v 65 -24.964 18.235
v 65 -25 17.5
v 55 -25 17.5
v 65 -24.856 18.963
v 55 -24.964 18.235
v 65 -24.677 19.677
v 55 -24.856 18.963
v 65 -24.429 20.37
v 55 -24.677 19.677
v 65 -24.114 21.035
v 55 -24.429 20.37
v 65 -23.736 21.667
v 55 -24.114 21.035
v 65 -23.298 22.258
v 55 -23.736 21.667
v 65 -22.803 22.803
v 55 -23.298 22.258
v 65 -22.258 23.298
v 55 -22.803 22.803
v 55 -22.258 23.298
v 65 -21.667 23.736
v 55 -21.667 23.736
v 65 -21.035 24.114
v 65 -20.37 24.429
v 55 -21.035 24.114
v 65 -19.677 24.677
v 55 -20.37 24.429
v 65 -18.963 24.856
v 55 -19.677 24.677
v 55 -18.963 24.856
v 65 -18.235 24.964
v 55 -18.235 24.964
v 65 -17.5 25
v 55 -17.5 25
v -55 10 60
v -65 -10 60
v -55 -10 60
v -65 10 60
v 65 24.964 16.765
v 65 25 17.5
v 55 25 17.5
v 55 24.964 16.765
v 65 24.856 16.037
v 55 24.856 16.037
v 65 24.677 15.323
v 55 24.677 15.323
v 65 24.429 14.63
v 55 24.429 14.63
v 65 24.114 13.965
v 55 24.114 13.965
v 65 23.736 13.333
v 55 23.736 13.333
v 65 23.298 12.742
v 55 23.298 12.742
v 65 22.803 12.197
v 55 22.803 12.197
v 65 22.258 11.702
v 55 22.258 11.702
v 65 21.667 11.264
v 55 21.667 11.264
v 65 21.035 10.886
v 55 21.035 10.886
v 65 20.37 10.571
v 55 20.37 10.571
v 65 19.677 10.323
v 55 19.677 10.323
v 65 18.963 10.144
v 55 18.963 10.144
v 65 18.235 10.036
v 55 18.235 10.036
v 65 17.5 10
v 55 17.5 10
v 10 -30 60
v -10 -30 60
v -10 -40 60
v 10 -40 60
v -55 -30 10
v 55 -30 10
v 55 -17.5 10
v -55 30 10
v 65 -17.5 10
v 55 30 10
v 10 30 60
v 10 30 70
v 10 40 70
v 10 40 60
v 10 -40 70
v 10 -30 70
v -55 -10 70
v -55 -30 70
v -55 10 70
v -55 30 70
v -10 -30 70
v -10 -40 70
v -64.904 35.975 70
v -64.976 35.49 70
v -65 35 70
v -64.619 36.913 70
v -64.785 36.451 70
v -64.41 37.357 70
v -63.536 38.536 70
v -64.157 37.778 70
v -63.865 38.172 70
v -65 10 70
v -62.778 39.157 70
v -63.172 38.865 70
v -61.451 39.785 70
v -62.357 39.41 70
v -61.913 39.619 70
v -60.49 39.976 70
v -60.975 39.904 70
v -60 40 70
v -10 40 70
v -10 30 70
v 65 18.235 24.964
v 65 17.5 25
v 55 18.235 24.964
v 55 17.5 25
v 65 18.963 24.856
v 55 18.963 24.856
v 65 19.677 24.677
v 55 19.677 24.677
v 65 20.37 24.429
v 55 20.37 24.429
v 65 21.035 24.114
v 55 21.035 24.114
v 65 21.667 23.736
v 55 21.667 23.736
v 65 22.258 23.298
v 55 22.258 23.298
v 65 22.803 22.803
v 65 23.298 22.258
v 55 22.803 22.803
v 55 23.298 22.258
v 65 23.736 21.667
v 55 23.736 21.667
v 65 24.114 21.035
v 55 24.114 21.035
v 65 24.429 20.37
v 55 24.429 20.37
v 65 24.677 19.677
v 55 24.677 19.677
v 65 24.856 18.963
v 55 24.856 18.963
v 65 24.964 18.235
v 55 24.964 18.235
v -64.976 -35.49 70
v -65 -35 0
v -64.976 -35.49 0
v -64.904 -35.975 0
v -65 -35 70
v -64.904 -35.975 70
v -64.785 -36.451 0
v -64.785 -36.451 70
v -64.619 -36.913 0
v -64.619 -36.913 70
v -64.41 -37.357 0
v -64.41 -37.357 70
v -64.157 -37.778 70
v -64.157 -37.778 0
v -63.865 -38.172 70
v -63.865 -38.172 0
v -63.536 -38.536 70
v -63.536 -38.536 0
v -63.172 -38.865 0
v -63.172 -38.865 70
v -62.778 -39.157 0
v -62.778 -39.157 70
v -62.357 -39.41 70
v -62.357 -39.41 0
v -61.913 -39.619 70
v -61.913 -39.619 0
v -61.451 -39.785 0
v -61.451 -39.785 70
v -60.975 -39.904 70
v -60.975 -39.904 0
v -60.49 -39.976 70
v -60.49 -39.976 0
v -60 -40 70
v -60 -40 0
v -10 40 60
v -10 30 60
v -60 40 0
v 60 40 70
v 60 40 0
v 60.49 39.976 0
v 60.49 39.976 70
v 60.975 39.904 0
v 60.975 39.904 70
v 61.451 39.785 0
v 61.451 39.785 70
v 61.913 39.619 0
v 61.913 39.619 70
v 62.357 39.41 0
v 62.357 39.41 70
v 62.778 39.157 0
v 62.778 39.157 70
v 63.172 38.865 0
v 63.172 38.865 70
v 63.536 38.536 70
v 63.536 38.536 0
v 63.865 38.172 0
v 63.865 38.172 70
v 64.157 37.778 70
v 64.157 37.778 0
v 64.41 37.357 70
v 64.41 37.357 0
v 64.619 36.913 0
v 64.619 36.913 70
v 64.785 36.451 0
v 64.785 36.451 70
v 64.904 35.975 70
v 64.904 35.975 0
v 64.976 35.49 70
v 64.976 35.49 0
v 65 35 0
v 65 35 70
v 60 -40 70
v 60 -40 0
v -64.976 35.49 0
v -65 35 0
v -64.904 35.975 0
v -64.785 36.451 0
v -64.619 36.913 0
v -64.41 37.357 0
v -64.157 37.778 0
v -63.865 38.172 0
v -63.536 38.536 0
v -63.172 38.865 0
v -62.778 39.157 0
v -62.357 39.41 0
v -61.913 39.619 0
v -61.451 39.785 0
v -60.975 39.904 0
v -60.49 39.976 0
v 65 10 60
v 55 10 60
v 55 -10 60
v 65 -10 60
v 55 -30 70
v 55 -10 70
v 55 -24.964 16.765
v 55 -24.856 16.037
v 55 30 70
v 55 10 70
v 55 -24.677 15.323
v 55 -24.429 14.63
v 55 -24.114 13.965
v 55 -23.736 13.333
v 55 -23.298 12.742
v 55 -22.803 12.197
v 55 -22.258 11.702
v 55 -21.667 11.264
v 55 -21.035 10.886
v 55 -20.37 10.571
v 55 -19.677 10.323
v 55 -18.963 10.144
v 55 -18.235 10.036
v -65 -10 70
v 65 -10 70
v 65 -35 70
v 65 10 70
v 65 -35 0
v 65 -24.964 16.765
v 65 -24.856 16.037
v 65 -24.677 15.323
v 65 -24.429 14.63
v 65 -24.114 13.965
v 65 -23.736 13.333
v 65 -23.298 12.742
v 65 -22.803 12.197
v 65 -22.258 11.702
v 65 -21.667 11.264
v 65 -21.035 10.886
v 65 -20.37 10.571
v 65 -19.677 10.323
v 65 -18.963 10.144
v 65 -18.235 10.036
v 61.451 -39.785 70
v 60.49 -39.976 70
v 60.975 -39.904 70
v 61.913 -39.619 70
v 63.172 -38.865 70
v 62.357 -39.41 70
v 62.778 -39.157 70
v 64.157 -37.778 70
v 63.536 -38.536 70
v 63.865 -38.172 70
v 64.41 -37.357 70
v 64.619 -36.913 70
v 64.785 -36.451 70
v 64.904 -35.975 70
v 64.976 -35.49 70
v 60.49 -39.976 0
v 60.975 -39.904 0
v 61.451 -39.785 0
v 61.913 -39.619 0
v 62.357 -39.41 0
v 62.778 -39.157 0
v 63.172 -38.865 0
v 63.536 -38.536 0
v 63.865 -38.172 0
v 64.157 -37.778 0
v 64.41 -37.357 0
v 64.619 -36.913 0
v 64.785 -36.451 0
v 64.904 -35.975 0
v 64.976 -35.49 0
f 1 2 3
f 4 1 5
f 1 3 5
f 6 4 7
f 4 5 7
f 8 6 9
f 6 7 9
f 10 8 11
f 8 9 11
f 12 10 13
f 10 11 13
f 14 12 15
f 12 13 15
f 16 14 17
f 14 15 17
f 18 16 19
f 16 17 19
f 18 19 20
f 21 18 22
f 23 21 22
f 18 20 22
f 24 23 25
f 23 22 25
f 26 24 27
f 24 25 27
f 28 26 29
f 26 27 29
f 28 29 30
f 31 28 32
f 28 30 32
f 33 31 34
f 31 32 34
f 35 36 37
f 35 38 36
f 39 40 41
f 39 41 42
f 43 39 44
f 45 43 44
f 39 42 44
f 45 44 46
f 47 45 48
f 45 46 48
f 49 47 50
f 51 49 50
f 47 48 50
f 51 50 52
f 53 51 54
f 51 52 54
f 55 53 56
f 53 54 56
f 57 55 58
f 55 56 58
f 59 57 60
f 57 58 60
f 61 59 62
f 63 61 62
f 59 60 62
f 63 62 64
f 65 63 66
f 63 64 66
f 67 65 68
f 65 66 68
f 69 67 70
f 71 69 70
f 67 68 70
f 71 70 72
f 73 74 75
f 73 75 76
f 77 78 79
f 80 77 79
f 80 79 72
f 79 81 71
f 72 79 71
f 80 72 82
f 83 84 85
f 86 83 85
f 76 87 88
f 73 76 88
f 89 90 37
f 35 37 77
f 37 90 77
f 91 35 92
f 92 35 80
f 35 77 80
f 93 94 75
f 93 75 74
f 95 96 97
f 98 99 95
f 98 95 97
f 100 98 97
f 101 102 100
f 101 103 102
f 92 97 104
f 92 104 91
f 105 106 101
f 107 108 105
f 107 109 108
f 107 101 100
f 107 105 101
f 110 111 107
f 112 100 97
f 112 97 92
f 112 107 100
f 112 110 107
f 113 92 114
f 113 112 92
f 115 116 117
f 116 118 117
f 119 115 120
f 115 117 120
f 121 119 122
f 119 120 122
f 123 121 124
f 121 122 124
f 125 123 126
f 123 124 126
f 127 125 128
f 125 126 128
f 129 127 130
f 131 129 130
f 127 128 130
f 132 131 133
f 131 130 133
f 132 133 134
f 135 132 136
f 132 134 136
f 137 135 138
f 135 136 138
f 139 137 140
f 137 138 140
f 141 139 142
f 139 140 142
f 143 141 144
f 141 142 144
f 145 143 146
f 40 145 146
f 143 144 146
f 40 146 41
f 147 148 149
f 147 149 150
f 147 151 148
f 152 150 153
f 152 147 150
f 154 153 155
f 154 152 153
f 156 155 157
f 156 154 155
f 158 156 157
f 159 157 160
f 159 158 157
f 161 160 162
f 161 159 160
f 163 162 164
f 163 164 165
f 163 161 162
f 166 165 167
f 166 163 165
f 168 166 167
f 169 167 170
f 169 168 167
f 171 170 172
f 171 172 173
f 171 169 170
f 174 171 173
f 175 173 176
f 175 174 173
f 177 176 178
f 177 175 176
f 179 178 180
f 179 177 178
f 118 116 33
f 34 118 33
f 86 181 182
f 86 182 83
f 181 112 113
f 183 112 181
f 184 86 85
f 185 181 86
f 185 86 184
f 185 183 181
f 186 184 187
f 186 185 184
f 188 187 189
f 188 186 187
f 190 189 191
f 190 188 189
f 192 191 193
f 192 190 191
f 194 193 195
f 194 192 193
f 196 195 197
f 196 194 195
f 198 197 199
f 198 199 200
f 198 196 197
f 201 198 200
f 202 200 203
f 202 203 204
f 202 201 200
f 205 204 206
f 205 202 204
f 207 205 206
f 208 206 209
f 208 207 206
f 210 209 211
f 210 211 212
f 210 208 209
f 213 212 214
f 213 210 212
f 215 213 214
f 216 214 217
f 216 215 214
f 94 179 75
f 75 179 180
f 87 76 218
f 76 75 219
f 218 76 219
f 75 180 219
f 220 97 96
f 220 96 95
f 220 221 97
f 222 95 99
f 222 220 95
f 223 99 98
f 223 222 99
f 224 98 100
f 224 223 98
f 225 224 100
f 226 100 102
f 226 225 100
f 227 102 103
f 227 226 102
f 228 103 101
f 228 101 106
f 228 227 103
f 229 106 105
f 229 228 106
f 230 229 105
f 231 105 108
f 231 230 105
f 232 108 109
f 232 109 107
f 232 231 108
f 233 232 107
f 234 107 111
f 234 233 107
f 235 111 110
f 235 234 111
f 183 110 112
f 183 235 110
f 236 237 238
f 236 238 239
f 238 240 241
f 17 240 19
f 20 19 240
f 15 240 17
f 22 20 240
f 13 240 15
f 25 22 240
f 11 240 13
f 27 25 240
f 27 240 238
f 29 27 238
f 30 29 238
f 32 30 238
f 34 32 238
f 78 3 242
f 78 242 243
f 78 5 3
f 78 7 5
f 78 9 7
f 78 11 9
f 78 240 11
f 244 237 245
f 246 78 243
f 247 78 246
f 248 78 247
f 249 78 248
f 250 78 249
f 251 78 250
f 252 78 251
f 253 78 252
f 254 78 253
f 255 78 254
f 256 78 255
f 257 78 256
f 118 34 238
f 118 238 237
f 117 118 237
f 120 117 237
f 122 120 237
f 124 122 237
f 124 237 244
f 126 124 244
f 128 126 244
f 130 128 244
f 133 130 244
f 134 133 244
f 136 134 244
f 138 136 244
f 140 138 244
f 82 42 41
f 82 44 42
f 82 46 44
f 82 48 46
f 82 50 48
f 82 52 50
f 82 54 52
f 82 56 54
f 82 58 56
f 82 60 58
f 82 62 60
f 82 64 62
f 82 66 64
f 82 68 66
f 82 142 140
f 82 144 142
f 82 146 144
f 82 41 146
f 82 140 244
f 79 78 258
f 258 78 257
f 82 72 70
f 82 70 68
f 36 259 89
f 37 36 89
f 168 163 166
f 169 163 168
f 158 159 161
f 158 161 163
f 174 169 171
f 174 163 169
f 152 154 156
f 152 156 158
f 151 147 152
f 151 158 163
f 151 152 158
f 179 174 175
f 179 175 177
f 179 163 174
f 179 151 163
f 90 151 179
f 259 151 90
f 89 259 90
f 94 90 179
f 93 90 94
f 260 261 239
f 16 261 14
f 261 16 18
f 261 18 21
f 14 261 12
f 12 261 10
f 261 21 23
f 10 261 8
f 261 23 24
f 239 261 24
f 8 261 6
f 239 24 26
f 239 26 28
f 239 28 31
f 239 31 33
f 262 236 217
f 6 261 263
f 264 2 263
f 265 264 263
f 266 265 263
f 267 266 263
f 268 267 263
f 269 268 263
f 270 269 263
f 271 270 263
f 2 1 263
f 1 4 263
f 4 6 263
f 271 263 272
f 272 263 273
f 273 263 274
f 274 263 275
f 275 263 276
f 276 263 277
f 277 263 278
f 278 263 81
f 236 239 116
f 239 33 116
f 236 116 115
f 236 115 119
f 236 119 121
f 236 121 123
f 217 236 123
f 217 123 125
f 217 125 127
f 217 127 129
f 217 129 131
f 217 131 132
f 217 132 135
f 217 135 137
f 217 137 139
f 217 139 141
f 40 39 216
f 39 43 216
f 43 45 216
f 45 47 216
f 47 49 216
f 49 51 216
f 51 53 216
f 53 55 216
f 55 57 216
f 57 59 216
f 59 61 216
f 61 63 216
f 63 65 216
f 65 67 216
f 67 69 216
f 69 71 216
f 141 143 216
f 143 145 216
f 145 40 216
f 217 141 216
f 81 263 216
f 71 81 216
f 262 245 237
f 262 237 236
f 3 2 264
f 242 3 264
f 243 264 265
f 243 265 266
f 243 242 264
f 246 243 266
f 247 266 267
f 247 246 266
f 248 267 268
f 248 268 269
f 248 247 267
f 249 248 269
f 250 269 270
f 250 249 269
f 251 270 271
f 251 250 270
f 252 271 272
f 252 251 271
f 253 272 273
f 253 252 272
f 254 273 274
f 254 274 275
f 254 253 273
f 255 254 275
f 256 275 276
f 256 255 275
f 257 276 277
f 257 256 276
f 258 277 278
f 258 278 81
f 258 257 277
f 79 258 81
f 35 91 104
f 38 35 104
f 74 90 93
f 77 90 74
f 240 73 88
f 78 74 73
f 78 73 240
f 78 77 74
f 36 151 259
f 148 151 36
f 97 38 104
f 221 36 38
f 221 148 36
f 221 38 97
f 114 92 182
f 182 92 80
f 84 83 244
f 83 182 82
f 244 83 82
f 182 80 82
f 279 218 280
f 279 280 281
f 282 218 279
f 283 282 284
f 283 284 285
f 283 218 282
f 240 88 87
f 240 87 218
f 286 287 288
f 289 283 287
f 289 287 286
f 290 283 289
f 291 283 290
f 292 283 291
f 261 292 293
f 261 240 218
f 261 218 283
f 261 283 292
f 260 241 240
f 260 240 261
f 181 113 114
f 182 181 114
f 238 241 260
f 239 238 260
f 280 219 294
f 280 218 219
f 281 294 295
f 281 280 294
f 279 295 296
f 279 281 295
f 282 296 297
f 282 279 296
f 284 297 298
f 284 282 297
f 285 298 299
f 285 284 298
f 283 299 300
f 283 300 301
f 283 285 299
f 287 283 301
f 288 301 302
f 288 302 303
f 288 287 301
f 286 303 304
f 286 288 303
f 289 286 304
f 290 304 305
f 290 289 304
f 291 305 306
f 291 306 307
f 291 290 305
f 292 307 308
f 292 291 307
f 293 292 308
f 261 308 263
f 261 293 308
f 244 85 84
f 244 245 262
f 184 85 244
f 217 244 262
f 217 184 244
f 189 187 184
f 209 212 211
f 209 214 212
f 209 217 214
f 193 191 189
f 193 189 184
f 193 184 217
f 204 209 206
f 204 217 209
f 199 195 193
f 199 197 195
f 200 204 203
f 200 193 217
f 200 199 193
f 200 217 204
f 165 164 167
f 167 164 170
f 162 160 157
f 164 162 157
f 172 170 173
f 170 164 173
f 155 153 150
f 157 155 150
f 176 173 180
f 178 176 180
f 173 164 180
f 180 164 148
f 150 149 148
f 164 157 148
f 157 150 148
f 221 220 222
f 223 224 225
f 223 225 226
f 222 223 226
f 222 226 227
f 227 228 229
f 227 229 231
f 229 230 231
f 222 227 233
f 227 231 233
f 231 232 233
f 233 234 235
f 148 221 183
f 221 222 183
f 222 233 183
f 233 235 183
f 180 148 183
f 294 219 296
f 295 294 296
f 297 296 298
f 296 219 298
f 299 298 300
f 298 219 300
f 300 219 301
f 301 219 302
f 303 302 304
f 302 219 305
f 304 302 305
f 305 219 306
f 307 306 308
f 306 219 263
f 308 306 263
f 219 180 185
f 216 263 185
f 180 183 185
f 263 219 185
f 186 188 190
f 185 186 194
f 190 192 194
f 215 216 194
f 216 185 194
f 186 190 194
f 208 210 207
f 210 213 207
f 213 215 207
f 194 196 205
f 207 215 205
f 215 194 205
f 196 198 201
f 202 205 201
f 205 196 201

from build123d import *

# Parameters (mm, degrees)
F1_DEPTH = 10
F2_W     = 130
F2_H     = 80
F2_W_2   = 110
F2_H_2   = 60
F3_DEPTH = 60
F4_W     = 20
F4_H     = 10
F4_W_2   = 10
F4_H_2   = 20
F5_DEPTH = 10
F6_R     = 5
F8_DEPTH = 25
F9_R     = 7.49999


# Not quite as in the source:
# - a fillet or chamfer is up to 0.001 mm smaller than in the source, because OpenCascade refuses the exact size


with BuildPart() as f1:
    # F0 (on Top) → F1 (new body)
    with BuildSketch(Plane.XY):
        Polygon((55, 40), (-55, 40), (-65, 40), (-65, -40), (-55, -40), (65, -40), (65, -30), (65, 40), align=None)
    extrude(amount=F1_DEPTH)

    # F2 (on face) → F3 (join)
    with BuildSketch(Plane.XY.offset(10)):
        Rectangle(F2_W, F2_H)
        Rectangle(F2_W_2, F2_H_2, mode=Mode.SUBTRACT)
    extrude(amount=F3_DEPTH)

    # F4 (on face) → F5 (cut)
    with BuildSketch(Plane.XY.offset(70)):
        Polygon((10, 30), (10, 40), (0, 40), (-10, 40), (-10, 30), align=None)
        Polygon((-65, 0), (-65, -10), (-55, -10), (-55, 10), (-65, 10), align=None)
        with Locations((0, -35)):
            Rectangle(F4_W, F4_H)
        with Locations((60, 0)):
            Rectangle(F4_W_2, F4_H_2)
    extrude(amount=-F5_DEPTH, mode=Mode.SUBTRACT)

    # F6
    f6_edges = [f1.edges().sort_by_distance(p)[0] for p in [
        (-65, -40, 35),
        (65, -40, 35),
        (-65, 40, 35),
        (65, 40, 35),
    ]]
    fillet(f6_edges, radius=F6_R)

    # F7 (on face) → F8 (cut)
    with BuildSketch(Plane.YZ.offset(65)):
        Polygon((-25, 10), (0, 10), (25, 10), (25, 25), (-25, 25), align=None)
    extrude(amount=-F8_DEPTH, mode=Mode.SUBTRACT)

    # F9 (radius 7.5 in the source; OpenCascade refuses exactly that, so slightly less here)
    f9_edges = [f1.edges().sort_by_distance(p)[0] for p in [
        (60, 25, 25),
        (60, 25, 10),
        (60, -25, 10),
        (60, -25, 25),
    ]]
    fillet(f9_edges, radius=F9_R)


solid = f1.part
